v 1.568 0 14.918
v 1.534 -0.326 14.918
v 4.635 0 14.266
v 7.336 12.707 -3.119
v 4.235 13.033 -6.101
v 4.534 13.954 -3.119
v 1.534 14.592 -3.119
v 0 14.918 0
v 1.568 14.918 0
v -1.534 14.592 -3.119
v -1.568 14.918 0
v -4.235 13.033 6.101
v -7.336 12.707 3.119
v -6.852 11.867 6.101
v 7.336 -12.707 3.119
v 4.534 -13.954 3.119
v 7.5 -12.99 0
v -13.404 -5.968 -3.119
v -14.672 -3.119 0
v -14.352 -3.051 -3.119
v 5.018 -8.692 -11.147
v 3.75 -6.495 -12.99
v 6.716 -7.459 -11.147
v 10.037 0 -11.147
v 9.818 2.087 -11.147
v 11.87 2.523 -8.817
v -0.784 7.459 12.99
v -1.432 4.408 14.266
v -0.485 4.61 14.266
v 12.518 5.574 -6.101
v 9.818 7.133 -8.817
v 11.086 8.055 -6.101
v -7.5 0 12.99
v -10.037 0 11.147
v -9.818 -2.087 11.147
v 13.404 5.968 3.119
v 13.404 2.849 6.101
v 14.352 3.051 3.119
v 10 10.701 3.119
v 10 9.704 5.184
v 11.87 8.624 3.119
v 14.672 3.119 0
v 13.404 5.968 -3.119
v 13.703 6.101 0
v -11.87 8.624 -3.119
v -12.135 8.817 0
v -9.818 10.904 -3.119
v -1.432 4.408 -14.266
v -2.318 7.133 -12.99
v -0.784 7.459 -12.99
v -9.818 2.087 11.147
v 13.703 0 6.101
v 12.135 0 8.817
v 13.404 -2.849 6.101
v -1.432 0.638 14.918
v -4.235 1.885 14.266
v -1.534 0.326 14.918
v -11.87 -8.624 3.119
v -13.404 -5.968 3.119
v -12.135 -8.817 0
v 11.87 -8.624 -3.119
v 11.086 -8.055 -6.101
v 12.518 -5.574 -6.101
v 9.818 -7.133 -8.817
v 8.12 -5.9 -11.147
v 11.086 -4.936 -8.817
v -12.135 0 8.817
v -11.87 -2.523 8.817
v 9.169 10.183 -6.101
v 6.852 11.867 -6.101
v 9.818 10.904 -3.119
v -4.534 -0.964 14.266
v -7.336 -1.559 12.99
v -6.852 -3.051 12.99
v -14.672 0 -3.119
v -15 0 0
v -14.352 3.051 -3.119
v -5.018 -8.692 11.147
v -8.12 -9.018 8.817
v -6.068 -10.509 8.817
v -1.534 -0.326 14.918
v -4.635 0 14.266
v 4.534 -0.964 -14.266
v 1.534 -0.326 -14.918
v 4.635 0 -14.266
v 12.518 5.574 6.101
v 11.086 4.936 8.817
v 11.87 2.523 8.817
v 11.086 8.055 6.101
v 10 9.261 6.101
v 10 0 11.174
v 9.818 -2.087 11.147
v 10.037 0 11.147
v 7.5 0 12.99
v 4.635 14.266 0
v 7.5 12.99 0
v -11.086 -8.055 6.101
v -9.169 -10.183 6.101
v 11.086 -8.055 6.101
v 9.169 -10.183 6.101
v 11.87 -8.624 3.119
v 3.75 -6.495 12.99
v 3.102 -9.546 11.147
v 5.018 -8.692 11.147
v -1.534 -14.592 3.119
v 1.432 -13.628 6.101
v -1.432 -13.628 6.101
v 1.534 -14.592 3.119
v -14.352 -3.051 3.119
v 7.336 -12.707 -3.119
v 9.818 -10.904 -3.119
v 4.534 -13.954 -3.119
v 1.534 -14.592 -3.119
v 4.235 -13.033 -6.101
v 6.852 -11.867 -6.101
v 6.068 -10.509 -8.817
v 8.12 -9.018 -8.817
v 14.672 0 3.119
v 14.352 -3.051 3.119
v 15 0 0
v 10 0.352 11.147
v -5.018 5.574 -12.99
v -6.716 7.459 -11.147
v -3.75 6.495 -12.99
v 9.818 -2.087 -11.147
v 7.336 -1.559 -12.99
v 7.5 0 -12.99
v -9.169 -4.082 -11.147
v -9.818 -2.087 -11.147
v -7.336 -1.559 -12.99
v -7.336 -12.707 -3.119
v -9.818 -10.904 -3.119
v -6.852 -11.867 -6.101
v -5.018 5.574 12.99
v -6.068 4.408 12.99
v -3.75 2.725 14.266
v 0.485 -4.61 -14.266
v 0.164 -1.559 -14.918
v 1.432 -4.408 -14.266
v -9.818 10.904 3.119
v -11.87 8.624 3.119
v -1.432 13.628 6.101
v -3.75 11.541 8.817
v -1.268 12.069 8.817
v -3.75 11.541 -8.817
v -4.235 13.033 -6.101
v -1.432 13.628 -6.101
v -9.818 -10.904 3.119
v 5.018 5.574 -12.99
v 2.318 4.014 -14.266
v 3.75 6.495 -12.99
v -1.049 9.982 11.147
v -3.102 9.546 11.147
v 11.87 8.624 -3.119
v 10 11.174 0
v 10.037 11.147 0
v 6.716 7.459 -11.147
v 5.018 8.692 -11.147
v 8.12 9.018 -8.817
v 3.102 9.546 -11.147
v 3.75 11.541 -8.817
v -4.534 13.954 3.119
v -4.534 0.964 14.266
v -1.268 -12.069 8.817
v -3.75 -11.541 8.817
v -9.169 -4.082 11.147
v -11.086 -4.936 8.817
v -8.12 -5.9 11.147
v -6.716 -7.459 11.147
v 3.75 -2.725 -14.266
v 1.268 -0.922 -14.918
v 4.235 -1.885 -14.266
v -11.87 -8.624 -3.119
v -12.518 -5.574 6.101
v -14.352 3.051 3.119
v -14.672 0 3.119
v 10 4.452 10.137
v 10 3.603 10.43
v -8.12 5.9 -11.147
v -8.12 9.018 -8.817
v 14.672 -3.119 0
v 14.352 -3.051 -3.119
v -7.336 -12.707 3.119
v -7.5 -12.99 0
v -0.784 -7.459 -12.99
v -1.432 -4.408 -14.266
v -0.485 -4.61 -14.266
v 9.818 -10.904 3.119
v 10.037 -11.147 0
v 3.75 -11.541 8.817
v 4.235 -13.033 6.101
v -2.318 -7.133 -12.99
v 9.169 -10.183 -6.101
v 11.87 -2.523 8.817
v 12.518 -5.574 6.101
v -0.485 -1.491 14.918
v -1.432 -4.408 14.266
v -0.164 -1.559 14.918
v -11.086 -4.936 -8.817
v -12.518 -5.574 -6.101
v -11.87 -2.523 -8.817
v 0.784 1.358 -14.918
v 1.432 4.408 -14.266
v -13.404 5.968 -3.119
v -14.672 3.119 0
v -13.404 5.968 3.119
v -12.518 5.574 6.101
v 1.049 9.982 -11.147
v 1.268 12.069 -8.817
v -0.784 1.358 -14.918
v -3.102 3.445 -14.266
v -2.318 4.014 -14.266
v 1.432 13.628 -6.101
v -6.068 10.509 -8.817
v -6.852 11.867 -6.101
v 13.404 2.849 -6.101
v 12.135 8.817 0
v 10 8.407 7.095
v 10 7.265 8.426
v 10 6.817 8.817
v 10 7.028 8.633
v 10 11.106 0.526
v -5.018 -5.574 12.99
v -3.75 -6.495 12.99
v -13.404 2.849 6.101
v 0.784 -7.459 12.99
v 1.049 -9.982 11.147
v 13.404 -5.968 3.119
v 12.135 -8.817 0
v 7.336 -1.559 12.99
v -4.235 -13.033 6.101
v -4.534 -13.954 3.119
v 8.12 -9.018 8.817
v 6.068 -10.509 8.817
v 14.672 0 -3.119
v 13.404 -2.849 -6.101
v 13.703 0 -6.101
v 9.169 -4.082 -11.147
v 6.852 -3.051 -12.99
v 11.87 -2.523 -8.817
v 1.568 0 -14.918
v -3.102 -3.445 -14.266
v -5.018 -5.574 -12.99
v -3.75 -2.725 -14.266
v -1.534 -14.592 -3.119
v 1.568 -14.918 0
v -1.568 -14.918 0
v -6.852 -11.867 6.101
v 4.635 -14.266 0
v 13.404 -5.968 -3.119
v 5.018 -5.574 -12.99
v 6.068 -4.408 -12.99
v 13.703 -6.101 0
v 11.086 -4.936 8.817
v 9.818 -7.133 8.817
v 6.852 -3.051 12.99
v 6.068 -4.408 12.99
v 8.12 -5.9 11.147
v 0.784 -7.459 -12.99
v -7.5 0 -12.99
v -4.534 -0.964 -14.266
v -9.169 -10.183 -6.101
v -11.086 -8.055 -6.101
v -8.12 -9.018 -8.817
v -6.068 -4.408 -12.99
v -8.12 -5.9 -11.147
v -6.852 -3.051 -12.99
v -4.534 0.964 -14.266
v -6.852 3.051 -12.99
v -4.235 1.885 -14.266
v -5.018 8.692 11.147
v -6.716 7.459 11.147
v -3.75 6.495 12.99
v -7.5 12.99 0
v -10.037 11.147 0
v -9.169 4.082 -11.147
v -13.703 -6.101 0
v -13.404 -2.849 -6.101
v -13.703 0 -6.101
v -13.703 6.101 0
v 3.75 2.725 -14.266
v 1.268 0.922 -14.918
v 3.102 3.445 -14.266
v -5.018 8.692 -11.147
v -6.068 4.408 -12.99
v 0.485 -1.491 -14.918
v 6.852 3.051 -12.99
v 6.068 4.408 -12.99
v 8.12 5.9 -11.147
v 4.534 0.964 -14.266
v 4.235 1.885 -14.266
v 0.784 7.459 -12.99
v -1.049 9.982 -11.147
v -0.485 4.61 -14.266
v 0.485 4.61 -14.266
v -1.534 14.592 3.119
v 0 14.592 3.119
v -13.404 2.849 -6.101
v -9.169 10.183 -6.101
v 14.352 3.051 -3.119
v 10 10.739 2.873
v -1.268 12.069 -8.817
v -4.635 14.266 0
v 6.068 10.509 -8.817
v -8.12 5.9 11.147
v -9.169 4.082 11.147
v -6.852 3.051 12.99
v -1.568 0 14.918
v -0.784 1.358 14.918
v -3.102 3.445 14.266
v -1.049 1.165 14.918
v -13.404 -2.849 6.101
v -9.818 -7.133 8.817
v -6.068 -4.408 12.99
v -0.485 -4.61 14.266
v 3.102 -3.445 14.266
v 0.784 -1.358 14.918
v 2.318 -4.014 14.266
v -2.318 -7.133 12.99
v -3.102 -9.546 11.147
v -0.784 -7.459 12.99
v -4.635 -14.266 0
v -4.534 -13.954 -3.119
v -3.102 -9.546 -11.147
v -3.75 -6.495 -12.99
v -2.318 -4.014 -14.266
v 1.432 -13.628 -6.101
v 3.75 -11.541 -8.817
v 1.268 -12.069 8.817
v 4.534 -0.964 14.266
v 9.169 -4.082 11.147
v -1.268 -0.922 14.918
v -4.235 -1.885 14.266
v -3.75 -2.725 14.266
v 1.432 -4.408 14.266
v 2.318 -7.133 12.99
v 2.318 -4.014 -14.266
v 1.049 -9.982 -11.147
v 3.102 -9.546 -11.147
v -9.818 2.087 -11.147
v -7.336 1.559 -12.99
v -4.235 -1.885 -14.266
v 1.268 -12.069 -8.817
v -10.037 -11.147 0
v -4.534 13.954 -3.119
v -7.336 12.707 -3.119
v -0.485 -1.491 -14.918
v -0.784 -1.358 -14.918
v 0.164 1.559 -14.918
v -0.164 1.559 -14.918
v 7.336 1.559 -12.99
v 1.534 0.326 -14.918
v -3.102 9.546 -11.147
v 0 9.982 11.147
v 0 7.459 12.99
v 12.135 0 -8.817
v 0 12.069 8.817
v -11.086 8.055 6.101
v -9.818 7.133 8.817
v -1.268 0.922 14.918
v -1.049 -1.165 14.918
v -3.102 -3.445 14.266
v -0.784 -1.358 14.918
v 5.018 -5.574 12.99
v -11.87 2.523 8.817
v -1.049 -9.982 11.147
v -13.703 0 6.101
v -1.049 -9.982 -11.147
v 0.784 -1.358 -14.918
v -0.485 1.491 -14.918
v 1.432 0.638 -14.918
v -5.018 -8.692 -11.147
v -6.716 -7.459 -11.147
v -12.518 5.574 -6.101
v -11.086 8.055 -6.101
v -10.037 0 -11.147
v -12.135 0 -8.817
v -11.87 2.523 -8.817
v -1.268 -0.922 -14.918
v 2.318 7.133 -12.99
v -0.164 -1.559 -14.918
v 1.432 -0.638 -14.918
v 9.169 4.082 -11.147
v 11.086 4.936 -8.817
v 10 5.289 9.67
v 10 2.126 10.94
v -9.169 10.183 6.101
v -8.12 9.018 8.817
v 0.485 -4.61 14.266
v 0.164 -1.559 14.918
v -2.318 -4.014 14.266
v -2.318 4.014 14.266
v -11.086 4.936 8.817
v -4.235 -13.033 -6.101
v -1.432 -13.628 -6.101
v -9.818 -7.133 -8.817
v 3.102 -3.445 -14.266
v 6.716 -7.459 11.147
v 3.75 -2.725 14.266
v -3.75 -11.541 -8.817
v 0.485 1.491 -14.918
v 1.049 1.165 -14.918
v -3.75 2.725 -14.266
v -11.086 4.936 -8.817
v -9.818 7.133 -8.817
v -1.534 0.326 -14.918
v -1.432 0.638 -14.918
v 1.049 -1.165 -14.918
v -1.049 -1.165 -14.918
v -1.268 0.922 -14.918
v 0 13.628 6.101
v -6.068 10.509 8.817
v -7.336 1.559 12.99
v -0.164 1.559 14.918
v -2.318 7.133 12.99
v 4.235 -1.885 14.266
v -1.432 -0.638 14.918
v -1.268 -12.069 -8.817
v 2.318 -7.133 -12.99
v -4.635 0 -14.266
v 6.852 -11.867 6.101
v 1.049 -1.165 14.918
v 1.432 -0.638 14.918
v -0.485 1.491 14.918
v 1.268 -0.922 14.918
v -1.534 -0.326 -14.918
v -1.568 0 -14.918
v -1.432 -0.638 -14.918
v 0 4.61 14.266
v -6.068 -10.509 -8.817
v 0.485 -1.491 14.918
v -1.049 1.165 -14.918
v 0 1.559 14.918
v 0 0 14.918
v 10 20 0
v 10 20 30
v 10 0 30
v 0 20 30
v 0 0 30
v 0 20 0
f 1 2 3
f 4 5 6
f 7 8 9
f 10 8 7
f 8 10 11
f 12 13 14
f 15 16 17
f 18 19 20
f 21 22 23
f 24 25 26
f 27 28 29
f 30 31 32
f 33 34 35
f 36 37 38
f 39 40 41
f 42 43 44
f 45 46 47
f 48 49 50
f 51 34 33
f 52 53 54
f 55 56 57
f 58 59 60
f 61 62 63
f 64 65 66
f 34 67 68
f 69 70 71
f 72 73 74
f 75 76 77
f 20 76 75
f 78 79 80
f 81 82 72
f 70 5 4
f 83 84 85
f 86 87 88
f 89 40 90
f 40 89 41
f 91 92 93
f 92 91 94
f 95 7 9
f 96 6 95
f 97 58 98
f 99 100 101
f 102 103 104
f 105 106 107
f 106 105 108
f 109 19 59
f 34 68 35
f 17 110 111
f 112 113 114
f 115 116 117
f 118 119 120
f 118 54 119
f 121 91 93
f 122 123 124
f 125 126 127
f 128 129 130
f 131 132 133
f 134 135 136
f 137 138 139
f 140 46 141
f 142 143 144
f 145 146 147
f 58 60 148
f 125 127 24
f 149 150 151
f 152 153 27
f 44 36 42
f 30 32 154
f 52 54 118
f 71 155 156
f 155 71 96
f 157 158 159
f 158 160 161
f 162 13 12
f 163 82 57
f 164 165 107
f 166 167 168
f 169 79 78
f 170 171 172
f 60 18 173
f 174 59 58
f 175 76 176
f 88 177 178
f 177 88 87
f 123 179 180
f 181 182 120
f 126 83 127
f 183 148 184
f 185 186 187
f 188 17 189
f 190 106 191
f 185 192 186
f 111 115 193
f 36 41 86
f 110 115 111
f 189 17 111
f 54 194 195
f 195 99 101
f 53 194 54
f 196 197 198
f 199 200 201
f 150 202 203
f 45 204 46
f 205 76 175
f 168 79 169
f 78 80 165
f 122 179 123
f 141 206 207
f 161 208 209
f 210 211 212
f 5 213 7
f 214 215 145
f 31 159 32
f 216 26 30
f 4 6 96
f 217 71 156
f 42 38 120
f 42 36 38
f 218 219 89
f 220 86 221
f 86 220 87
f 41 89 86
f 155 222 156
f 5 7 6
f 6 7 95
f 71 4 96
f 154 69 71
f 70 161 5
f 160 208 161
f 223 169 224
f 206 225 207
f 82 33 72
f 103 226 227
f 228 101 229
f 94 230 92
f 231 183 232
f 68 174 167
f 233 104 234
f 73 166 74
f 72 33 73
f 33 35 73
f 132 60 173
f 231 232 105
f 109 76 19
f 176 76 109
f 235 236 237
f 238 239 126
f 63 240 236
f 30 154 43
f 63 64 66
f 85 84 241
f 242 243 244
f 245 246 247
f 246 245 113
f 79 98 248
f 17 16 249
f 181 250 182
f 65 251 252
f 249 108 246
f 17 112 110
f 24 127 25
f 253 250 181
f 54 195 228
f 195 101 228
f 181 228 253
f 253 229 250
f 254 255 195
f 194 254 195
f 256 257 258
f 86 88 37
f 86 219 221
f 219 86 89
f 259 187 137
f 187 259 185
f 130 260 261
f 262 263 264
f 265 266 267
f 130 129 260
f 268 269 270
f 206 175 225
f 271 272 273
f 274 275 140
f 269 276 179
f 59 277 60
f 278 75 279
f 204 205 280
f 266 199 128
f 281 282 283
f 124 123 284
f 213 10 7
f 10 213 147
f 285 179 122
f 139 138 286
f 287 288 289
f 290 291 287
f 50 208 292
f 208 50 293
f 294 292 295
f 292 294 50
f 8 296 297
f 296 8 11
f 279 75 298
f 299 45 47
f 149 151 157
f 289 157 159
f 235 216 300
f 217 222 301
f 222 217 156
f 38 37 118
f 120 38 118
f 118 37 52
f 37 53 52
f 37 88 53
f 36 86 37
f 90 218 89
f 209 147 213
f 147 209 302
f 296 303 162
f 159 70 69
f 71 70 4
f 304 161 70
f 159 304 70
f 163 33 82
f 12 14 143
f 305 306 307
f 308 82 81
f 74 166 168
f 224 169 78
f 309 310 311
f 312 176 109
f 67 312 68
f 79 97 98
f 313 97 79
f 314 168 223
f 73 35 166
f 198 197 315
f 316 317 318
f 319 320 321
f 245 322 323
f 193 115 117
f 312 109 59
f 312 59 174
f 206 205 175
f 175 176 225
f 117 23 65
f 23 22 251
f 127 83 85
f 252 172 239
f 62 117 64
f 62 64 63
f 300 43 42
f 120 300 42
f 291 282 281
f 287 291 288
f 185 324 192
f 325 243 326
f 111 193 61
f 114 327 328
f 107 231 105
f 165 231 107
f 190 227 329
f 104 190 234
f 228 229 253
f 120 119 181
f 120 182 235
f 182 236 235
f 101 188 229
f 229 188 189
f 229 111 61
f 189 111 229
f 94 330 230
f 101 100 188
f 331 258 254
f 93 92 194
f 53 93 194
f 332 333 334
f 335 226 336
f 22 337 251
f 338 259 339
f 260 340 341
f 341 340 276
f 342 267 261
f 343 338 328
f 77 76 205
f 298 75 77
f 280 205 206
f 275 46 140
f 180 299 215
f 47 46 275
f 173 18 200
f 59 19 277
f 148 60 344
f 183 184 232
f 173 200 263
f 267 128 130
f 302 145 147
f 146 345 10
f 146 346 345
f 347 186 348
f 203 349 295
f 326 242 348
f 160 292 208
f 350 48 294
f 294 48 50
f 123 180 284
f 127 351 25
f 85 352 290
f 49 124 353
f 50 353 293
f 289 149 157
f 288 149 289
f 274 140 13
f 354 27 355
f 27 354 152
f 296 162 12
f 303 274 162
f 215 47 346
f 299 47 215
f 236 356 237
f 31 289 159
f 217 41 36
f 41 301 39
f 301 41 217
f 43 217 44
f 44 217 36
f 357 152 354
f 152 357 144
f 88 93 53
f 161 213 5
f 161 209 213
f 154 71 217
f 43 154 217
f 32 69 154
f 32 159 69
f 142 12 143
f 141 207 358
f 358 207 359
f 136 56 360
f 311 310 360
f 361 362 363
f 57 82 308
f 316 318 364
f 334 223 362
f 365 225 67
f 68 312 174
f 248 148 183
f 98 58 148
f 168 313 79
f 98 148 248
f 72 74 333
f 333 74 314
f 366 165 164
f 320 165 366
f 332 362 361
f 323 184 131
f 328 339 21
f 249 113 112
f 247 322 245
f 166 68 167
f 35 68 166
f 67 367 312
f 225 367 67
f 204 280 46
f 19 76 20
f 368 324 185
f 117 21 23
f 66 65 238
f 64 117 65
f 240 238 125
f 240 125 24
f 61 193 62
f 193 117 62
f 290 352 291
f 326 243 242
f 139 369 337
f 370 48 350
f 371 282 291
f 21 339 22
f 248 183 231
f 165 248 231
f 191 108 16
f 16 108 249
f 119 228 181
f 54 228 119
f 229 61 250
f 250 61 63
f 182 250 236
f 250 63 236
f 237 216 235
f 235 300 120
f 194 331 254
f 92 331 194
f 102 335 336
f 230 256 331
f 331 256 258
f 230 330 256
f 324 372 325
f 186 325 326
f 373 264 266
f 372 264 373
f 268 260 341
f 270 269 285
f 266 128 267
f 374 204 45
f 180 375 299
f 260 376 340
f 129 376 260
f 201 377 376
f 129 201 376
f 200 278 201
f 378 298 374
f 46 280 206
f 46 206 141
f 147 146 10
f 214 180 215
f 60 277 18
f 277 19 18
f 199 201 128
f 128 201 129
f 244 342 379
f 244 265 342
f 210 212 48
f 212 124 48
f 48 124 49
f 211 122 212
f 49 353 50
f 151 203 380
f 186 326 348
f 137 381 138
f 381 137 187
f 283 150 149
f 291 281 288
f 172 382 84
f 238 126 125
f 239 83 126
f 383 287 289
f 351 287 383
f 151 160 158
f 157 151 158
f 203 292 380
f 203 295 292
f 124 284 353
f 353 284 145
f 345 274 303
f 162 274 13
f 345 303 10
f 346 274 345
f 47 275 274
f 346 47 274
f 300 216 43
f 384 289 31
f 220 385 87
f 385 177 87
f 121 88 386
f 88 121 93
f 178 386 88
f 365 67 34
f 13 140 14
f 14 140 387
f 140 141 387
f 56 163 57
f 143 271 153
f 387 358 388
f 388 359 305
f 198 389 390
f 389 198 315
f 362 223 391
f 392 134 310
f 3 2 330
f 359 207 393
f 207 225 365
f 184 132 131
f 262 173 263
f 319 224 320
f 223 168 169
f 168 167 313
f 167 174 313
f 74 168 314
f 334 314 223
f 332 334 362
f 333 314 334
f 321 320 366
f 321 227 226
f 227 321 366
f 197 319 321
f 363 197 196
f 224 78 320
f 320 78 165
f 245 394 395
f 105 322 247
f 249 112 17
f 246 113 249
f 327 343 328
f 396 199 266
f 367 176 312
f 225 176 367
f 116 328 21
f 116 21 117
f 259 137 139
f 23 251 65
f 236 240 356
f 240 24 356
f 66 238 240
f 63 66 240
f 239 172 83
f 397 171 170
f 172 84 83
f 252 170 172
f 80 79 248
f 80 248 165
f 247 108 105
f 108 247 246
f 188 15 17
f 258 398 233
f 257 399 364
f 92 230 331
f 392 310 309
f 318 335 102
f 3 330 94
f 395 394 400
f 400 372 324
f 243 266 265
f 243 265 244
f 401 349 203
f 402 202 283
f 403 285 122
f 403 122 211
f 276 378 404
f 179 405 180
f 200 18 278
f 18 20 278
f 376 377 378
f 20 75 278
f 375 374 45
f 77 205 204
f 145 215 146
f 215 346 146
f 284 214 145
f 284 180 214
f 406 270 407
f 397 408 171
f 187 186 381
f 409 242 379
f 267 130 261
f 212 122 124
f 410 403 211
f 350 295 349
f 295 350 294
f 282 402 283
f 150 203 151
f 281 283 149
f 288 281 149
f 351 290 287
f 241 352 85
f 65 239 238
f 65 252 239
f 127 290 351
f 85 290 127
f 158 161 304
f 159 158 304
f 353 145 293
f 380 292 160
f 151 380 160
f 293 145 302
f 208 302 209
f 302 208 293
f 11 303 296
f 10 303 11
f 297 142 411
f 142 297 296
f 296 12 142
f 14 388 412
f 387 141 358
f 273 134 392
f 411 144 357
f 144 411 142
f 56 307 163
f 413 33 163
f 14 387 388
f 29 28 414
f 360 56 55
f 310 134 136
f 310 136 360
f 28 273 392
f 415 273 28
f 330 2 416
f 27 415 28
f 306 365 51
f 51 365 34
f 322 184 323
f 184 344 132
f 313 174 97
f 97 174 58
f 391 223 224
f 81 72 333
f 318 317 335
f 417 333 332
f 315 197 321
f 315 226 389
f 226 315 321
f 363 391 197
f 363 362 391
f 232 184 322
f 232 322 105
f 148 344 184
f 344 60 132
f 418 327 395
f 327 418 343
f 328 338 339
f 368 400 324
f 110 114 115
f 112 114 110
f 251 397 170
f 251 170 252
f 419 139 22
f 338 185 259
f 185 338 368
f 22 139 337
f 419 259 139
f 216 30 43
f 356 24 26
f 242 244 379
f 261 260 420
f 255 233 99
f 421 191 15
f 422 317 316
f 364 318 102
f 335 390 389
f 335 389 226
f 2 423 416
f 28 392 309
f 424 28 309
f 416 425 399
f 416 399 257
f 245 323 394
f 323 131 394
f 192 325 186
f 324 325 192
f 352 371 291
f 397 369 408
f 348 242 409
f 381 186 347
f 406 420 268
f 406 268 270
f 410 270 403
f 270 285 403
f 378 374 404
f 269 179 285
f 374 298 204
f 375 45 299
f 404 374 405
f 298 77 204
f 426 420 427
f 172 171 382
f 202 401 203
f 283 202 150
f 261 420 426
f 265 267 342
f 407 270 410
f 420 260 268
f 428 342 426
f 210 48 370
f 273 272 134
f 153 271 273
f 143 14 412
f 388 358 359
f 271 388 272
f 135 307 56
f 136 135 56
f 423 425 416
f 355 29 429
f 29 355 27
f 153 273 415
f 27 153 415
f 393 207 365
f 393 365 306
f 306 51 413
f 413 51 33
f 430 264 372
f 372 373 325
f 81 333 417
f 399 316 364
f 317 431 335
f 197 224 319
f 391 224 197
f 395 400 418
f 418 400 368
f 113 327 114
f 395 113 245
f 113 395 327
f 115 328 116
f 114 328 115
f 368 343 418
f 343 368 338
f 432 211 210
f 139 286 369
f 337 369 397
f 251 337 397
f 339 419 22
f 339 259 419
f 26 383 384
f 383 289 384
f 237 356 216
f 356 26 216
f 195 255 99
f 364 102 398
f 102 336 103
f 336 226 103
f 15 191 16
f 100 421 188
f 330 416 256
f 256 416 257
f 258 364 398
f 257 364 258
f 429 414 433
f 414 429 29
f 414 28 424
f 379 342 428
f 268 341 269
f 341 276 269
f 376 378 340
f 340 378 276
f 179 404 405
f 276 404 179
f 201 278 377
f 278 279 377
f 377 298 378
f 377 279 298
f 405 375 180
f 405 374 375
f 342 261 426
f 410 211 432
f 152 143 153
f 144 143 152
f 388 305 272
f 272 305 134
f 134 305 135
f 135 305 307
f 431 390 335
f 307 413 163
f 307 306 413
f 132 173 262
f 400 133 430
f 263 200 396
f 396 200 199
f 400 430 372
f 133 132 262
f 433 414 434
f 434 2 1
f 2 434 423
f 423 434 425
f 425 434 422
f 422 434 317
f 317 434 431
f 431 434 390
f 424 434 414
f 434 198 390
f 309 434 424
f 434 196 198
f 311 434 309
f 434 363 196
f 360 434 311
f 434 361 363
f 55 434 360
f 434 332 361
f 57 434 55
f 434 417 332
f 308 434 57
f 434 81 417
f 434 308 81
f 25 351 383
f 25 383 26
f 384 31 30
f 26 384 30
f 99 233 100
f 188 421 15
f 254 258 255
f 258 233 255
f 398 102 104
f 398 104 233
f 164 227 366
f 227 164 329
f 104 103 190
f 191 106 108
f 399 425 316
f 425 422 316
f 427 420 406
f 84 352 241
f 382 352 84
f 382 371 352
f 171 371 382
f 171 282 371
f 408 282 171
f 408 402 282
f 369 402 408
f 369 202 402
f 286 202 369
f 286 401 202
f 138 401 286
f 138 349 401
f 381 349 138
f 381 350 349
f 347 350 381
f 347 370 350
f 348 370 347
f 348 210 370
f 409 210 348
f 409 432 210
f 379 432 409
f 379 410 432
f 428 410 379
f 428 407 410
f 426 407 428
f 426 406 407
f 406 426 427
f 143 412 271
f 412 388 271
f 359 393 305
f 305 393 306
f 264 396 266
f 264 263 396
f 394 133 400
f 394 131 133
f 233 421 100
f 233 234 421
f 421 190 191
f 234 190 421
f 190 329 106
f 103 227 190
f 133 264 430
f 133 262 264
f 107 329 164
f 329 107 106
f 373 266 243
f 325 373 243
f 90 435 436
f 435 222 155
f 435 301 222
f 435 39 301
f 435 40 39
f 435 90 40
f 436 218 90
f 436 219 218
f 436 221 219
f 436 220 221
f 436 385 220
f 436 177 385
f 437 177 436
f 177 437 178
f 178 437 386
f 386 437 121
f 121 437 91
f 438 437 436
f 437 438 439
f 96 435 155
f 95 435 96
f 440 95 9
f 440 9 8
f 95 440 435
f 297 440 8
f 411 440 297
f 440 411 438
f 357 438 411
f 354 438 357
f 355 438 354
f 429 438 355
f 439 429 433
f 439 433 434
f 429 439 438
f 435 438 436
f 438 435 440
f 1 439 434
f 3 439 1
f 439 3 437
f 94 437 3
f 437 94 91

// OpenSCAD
union() {
sphere(d=30);
cube(size=[10,20,30]);
}

/*
This test should error - if Name is not a list, nothing else should be.
<json>
    {
        "Name": "Variable",
        "Desc": ["Desc 1"],
        "LowKeyword": ["Lost 1", "Lost 2"],
        "HighKeyword": ["Printed1", "Printed2", "Printed 3", "Printed 4"],
        "varBase": "VarBase1",
        "minDefault": 0.1,
        "maxDefault": [1, 2, 3],
        "minDefaultND": "0.5 * nozzleDiameter",
        "maxDefaultND": "5 * nozzleDiameter",
        "cameraData": "-2.28,2.59,6.06,59.9,0,13.8,113.4",
        "sortOrder": [3, 2, 1],
		"instanceCount": 10
    }
</json>
*/
